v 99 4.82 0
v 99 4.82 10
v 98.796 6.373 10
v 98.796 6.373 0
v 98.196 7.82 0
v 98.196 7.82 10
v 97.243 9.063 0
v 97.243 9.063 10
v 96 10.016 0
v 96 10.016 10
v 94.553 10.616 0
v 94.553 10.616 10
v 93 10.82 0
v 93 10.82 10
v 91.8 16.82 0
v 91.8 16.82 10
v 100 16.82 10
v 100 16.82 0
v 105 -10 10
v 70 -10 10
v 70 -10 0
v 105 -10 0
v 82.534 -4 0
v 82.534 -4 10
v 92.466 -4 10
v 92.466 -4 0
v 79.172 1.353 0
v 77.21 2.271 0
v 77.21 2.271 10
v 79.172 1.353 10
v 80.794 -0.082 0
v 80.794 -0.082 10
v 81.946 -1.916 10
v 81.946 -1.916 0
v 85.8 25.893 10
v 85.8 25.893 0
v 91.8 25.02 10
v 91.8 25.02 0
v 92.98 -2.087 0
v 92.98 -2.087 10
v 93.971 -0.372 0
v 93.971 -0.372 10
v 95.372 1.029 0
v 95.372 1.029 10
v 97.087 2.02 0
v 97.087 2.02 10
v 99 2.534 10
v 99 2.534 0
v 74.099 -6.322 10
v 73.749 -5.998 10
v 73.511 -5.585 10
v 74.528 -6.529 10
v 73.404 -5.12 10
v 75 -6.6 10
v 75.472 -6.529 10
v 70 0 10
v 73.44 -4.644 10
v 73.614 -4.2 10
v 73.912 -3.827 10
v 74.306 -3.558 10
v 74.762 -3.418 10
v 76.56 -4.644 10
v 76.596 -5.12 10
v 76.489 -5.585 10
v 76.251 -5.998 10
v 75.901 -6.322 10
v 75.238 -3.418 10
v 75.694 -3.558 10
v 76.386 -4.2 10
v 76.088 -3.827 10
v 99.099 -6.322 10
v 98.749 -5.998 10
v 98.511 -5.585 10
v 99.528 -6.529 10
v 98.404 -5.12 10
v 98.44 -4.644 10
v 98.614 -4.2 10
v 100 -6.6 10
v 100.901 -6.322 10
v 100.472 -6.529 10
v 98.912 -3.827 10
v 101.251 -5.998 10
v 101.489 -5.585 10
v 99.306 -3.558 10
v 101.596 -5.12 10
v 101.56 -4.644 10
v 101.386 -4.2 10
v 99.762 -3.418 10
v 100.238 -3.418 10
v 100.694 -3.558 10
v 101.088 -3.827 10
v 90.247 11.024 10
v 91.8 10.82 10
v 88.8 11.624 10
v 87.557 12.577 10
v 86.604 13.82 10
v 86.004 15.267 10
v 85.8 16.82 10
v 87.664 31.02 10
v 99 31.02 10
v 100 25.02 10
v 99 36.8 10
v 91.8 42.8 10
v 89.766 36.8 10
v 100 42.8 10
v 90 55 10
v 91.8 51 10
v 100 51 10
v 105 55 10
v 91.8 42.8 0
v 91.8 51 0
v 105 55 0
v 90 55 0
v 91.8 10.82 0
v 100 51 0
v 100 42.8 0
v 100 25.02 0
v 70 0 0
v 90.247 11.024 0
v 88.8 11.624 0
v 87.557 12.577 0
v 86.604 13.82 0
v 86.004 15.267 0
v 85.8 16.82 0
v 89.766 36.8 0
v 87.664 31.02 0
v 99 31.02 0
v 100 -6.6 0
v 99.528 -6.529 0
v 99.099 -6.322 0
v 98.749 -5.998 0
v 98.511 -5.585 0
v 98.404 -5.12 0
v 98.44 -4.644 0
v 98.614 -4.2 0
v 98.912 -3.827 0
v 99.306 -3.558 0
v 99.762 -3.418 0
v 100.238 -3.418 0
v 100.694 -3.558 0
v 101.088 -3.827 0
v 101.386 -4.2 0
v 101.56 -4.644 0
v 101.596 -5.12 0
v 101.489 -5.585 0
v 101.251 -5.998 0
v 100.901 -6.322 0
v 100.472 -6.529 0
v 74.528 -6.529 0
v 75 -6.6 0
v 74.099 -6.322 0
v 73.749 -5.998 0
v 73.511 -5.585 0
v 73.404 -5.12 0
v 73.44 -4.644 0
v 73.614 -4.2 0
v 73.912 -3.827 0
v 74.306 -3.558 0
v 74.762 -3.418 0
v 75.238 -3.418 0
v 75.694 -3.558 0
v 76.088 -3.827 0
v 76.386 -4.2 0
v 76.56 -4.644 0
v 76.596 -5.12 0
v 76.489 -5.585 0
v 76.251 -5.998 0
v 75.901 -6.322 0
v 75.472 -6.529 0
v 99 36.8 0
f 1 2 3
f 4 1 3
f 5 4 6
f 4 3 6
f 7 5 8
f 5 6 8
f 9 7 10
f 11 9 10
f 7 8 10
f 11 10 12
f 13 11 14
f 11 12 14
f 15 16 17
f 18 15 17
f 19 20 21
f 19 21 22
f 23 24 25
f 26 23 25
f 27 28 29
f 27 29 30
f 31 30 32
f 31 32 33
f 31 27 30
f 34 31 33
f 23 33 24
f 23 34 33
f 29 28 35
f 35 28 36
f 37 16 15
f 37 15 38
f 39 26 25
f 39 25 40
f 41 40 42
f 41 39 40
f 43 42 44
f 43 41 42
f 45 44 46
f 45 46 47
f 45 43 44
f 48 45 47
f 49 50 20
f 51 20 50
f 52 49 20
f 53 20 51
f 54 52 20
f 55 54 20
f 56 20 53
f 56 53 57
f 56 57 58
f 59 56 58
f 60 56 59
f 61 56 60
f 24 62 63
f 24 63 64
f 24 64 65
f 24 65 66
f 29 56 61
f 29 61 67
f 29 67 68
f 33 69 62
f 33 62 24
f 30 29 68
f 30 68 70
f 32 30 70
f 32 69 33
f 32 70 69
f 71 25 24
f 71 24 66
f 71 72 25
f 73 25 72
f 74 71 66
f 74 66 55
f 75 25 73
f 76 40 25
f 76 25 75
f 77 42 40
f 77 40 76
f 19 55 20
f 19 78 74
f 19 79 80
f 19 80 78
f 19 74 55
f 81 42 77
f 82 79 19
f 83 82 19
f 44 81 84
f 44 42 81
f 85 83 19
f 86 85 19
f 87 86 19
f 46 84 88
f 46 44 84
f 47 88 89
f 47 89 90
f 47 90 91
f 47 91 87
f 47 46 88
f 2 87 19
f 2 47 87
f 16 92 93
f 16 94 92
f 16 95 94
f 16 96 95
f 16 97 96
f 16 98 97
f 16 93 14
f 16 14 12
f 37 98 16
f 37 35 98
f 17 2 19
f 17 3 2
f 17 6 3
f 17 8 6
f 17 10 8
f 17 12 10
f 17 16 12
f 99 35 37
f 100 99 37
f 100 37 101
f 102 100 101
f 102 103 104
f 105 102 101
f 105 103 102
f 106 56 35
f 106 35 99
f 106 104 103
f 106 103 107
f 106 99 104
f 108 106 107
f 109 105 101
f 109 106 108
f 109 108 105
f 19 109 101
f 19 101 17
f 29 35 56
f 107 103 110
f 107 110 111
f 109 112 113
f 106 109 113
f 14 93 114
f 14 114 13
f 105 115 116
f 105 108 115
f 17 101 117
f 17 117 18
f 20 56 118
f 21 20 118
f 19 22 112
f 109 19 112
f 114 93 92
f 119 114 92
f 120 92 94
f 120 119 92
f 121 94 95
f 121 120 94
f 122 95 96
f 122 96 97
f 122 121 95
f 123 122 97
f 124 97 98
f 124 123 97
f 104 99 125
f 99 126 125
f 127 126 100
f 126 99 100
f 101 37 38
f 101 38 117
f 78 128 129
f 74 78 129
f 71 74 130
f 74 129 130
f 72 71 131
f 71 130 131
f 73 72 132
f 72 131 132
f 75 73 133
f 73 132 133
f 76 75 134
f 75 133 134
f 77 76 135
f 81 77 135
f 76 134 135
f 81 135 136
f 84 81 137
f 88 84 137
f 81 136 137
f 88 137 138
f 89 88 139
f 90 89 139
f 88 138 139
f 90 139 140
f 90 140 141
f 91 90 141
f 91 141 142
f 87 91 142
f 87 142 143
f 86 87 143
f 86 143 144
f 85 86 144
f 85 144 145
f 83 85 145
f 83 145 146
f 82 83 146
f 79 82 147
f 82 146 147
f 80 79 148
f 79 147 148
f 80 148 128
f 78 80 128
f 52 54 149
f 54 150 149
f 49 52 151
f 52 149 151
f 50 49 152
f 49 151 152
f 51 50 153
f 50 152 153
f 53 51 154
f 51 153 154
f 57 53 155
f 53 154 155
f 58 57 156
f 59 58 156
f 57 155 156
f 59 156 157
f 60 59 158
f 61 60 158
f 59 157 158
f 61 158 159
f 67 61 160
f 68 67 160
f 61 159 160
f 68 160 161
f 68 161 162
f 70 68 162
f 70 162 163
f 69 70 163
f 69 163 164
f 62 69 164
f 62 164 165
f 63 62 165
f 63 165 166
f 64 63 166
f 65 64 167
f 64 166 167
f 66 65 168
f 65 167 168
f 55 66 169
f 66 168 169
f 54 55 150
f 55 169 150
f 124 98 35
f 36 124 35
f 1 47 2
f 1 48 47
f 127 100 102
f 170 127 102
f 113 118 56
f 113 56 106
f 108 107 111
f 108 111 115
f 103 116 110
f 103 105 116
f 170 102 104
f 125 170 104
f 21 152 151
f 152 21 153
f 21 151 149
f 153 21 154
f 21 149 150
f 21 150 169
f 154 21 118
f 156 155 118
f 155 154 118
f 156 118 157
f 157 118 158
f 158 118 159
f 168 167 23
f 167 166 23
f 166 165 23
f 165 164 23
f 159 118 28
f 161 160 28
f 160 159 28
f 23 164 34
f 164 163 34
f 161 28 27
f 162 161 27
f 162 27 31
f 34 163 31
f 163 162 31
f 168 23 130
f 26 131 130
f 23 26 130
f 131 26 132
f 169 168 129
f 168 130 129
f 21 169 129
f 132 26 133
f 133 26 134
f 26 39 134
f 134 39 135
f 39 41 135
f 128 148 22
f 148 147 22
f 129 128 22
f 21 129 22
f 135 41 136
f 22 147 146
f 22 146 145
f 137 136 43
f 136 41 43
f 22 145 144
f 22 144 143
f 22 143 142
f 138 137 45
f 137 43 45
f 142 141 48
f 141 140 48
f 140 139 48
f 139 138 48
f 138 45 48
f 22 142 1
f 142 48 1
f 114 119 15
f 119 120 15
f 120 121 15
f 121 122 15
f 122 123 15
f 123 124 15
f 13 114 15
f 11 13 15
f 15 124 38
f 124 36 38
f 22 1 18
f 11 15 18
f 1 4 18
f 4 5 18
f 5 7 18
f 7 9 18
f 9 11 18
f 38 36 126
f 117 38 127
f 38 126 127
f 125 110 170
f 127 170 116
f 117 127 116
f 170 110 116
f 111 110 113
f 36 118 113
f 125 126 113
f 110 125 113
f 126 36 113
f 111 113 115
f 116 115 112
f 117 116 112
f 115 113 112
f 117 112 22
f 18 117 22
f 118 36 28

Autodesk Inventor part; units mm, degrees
ref_plane "YZ Plane" through (0, 0, 0) normal (1, 0, 0) x (0, 1, 0)
ref_plane "XZ Plane" through (0, 0, 0) normal (0, 1, 0) x (-1, 0, 0)
ref_plane "XY Plane" through (0, 0, 0) normal (0, 0, 1) x (1, 0, 0)
sketch "Boceto1" plane through (0, 0, 0) normal (0, 0, 1) x (1, 0, 0)
  line L0 (0, 0) -> (105, 0)
  line L1 (105, 0) -> (105, 55)
  line L2 (105, 55) -> (0, 0)
  line L3 (105, 55) -> (90, 55)
  line L4 (90, 55) -> (0, 0)
  line L5 (0, 0) -> (70, 0)
  line L6 (70, 0) -> (90, 55)
  dimension "d0" = 105
  dimension "d1" = 55
  dimension "d4" = 15
  dimension "d10" = 70
extrude "Extrusión1" add sketch "Boceto1" along normal blind 10 contours L6 L2 L1 L0 | L6 L3 L2
sketch "Boceto2" plane through (0, 0, 10) normal (0, 0, 1) x (1, 0, 0)
  line L0 (-10.0369, 16.82) -> (-5.1631, 16.82) projected
  line L1 (-1.5564, 16.82) -> (-5.1631, 16.82) projected
  line L2 (-1.5564, 16.82) -> (105, 16.82)
  line L3 (105, 0) -> (105, 55) projected
  line L4 (105, 55) -> (90, 55) projected
  line L5 (70, 0) -> (105, 0) projected
  line L6 (100, 5) -> (14.5727, 5)
  line L7 (90, 55) -> (70, 0) projected
  line L8 (105, 55) -> (105, 42.8)
  line L9 (105, 55) -> (117.2, 55) construction
  line L10 (70, 0) -> (105, 0) projected
  line L11 (105, 0) -> (105, 16.82)
  line L12 (105, 0) -> (105, 55) projected
  line L13 (105, 16.82) -> (100, 16.82)
  line L14 (100, 16.82) -> (94.1, 16.82)
  line L15 (94.1, 16.82) -> (94.1, 25.02)
  line L16 (94.1, 25.02) -> (100, 25.02)
  line L17 (100, 25.02) -> (100, 16.82)
  line L18 (105, 42.8) -> (100, 42.8)
  line L19 (100, 42.8) -> (91.8, 42.8)
  line L20 (91.8, 42.8) -> (91.8, 51)
  line L21 (91.8, 51) -> (100, 51)
  line L22 (100, 51) -> (100, 42.8)
  line L23 (100, 16.82) -> (91.8, 16.82)
  line L24 (91.8, 16.82) -> (91.8, 25.02)
  line L25 (91.8, 25.02) -> (100, 25.02)
  line L26 (100, 25.02) -> (100, 16.82)
  point P0 (0, 0)
  point P1 (94.1, 16.82)
  point P2 (100, 25.02)
  point P3 (91.8, 16.82)
  point P4 (105, 25.02)
  point P5 (162.8, 25.02)
  point P6 (162.8, 16.82)
  dimension "d22" = 90
  dimension "d25" = 8.2
  dimension "d26" = 12.2
  dimension "d27" = 8.2
  dimension "d28" = 8.2
  dimension "d31" = 8.2
extrude "Extrusión2" cut sketch "Boceto2" against normal through all contours L24 L25 L15 L2 | L15 L16 L17 L2 | L19 L20 L21 L22
sketch "Boceto3" plane through (70, 0, 0) normal (0, -1, 0) x (1, 0, 0)
  line L0 (21.8, 10) -> (21.8, 0) projected
  line L1 (0, 10) -> (35, 10) projected
  line L2 (0, 0) -> (35, 0) projected
  line L3 (35, 0) -> (35, 10) projected
  line L4 (0, 10) -> (0, 0) projected
  point P0 (-70, 0)
extrude "Extrusión3" add sketch "Boceto3" along normal blind 10
sketch "Boceto4" plane through (0, 0, 10) normal (0, 0, 1) x (1, 0, 0)
  circle A0 centre (100, -5) radius 2.1 projected
  circle A1 centre (75, -5) radius 2.1 projected
  point P0 (0, 0)
hole "Agujero1" at (75, -5, 10) at (100, -5, 10) direction (0, 0, -1) diameter 3.2 depth 10
shell "Vaciado1" thickness 6 removed faces 2 at (88.9333, 2.8793, 10) at (88.9333, 2.8793, 0)
fillet "Empalme1" radius 6 2 edges at (99, 10.82, 5) (85.8, 10.82, 5)
properties part number "Soporte lateral"
